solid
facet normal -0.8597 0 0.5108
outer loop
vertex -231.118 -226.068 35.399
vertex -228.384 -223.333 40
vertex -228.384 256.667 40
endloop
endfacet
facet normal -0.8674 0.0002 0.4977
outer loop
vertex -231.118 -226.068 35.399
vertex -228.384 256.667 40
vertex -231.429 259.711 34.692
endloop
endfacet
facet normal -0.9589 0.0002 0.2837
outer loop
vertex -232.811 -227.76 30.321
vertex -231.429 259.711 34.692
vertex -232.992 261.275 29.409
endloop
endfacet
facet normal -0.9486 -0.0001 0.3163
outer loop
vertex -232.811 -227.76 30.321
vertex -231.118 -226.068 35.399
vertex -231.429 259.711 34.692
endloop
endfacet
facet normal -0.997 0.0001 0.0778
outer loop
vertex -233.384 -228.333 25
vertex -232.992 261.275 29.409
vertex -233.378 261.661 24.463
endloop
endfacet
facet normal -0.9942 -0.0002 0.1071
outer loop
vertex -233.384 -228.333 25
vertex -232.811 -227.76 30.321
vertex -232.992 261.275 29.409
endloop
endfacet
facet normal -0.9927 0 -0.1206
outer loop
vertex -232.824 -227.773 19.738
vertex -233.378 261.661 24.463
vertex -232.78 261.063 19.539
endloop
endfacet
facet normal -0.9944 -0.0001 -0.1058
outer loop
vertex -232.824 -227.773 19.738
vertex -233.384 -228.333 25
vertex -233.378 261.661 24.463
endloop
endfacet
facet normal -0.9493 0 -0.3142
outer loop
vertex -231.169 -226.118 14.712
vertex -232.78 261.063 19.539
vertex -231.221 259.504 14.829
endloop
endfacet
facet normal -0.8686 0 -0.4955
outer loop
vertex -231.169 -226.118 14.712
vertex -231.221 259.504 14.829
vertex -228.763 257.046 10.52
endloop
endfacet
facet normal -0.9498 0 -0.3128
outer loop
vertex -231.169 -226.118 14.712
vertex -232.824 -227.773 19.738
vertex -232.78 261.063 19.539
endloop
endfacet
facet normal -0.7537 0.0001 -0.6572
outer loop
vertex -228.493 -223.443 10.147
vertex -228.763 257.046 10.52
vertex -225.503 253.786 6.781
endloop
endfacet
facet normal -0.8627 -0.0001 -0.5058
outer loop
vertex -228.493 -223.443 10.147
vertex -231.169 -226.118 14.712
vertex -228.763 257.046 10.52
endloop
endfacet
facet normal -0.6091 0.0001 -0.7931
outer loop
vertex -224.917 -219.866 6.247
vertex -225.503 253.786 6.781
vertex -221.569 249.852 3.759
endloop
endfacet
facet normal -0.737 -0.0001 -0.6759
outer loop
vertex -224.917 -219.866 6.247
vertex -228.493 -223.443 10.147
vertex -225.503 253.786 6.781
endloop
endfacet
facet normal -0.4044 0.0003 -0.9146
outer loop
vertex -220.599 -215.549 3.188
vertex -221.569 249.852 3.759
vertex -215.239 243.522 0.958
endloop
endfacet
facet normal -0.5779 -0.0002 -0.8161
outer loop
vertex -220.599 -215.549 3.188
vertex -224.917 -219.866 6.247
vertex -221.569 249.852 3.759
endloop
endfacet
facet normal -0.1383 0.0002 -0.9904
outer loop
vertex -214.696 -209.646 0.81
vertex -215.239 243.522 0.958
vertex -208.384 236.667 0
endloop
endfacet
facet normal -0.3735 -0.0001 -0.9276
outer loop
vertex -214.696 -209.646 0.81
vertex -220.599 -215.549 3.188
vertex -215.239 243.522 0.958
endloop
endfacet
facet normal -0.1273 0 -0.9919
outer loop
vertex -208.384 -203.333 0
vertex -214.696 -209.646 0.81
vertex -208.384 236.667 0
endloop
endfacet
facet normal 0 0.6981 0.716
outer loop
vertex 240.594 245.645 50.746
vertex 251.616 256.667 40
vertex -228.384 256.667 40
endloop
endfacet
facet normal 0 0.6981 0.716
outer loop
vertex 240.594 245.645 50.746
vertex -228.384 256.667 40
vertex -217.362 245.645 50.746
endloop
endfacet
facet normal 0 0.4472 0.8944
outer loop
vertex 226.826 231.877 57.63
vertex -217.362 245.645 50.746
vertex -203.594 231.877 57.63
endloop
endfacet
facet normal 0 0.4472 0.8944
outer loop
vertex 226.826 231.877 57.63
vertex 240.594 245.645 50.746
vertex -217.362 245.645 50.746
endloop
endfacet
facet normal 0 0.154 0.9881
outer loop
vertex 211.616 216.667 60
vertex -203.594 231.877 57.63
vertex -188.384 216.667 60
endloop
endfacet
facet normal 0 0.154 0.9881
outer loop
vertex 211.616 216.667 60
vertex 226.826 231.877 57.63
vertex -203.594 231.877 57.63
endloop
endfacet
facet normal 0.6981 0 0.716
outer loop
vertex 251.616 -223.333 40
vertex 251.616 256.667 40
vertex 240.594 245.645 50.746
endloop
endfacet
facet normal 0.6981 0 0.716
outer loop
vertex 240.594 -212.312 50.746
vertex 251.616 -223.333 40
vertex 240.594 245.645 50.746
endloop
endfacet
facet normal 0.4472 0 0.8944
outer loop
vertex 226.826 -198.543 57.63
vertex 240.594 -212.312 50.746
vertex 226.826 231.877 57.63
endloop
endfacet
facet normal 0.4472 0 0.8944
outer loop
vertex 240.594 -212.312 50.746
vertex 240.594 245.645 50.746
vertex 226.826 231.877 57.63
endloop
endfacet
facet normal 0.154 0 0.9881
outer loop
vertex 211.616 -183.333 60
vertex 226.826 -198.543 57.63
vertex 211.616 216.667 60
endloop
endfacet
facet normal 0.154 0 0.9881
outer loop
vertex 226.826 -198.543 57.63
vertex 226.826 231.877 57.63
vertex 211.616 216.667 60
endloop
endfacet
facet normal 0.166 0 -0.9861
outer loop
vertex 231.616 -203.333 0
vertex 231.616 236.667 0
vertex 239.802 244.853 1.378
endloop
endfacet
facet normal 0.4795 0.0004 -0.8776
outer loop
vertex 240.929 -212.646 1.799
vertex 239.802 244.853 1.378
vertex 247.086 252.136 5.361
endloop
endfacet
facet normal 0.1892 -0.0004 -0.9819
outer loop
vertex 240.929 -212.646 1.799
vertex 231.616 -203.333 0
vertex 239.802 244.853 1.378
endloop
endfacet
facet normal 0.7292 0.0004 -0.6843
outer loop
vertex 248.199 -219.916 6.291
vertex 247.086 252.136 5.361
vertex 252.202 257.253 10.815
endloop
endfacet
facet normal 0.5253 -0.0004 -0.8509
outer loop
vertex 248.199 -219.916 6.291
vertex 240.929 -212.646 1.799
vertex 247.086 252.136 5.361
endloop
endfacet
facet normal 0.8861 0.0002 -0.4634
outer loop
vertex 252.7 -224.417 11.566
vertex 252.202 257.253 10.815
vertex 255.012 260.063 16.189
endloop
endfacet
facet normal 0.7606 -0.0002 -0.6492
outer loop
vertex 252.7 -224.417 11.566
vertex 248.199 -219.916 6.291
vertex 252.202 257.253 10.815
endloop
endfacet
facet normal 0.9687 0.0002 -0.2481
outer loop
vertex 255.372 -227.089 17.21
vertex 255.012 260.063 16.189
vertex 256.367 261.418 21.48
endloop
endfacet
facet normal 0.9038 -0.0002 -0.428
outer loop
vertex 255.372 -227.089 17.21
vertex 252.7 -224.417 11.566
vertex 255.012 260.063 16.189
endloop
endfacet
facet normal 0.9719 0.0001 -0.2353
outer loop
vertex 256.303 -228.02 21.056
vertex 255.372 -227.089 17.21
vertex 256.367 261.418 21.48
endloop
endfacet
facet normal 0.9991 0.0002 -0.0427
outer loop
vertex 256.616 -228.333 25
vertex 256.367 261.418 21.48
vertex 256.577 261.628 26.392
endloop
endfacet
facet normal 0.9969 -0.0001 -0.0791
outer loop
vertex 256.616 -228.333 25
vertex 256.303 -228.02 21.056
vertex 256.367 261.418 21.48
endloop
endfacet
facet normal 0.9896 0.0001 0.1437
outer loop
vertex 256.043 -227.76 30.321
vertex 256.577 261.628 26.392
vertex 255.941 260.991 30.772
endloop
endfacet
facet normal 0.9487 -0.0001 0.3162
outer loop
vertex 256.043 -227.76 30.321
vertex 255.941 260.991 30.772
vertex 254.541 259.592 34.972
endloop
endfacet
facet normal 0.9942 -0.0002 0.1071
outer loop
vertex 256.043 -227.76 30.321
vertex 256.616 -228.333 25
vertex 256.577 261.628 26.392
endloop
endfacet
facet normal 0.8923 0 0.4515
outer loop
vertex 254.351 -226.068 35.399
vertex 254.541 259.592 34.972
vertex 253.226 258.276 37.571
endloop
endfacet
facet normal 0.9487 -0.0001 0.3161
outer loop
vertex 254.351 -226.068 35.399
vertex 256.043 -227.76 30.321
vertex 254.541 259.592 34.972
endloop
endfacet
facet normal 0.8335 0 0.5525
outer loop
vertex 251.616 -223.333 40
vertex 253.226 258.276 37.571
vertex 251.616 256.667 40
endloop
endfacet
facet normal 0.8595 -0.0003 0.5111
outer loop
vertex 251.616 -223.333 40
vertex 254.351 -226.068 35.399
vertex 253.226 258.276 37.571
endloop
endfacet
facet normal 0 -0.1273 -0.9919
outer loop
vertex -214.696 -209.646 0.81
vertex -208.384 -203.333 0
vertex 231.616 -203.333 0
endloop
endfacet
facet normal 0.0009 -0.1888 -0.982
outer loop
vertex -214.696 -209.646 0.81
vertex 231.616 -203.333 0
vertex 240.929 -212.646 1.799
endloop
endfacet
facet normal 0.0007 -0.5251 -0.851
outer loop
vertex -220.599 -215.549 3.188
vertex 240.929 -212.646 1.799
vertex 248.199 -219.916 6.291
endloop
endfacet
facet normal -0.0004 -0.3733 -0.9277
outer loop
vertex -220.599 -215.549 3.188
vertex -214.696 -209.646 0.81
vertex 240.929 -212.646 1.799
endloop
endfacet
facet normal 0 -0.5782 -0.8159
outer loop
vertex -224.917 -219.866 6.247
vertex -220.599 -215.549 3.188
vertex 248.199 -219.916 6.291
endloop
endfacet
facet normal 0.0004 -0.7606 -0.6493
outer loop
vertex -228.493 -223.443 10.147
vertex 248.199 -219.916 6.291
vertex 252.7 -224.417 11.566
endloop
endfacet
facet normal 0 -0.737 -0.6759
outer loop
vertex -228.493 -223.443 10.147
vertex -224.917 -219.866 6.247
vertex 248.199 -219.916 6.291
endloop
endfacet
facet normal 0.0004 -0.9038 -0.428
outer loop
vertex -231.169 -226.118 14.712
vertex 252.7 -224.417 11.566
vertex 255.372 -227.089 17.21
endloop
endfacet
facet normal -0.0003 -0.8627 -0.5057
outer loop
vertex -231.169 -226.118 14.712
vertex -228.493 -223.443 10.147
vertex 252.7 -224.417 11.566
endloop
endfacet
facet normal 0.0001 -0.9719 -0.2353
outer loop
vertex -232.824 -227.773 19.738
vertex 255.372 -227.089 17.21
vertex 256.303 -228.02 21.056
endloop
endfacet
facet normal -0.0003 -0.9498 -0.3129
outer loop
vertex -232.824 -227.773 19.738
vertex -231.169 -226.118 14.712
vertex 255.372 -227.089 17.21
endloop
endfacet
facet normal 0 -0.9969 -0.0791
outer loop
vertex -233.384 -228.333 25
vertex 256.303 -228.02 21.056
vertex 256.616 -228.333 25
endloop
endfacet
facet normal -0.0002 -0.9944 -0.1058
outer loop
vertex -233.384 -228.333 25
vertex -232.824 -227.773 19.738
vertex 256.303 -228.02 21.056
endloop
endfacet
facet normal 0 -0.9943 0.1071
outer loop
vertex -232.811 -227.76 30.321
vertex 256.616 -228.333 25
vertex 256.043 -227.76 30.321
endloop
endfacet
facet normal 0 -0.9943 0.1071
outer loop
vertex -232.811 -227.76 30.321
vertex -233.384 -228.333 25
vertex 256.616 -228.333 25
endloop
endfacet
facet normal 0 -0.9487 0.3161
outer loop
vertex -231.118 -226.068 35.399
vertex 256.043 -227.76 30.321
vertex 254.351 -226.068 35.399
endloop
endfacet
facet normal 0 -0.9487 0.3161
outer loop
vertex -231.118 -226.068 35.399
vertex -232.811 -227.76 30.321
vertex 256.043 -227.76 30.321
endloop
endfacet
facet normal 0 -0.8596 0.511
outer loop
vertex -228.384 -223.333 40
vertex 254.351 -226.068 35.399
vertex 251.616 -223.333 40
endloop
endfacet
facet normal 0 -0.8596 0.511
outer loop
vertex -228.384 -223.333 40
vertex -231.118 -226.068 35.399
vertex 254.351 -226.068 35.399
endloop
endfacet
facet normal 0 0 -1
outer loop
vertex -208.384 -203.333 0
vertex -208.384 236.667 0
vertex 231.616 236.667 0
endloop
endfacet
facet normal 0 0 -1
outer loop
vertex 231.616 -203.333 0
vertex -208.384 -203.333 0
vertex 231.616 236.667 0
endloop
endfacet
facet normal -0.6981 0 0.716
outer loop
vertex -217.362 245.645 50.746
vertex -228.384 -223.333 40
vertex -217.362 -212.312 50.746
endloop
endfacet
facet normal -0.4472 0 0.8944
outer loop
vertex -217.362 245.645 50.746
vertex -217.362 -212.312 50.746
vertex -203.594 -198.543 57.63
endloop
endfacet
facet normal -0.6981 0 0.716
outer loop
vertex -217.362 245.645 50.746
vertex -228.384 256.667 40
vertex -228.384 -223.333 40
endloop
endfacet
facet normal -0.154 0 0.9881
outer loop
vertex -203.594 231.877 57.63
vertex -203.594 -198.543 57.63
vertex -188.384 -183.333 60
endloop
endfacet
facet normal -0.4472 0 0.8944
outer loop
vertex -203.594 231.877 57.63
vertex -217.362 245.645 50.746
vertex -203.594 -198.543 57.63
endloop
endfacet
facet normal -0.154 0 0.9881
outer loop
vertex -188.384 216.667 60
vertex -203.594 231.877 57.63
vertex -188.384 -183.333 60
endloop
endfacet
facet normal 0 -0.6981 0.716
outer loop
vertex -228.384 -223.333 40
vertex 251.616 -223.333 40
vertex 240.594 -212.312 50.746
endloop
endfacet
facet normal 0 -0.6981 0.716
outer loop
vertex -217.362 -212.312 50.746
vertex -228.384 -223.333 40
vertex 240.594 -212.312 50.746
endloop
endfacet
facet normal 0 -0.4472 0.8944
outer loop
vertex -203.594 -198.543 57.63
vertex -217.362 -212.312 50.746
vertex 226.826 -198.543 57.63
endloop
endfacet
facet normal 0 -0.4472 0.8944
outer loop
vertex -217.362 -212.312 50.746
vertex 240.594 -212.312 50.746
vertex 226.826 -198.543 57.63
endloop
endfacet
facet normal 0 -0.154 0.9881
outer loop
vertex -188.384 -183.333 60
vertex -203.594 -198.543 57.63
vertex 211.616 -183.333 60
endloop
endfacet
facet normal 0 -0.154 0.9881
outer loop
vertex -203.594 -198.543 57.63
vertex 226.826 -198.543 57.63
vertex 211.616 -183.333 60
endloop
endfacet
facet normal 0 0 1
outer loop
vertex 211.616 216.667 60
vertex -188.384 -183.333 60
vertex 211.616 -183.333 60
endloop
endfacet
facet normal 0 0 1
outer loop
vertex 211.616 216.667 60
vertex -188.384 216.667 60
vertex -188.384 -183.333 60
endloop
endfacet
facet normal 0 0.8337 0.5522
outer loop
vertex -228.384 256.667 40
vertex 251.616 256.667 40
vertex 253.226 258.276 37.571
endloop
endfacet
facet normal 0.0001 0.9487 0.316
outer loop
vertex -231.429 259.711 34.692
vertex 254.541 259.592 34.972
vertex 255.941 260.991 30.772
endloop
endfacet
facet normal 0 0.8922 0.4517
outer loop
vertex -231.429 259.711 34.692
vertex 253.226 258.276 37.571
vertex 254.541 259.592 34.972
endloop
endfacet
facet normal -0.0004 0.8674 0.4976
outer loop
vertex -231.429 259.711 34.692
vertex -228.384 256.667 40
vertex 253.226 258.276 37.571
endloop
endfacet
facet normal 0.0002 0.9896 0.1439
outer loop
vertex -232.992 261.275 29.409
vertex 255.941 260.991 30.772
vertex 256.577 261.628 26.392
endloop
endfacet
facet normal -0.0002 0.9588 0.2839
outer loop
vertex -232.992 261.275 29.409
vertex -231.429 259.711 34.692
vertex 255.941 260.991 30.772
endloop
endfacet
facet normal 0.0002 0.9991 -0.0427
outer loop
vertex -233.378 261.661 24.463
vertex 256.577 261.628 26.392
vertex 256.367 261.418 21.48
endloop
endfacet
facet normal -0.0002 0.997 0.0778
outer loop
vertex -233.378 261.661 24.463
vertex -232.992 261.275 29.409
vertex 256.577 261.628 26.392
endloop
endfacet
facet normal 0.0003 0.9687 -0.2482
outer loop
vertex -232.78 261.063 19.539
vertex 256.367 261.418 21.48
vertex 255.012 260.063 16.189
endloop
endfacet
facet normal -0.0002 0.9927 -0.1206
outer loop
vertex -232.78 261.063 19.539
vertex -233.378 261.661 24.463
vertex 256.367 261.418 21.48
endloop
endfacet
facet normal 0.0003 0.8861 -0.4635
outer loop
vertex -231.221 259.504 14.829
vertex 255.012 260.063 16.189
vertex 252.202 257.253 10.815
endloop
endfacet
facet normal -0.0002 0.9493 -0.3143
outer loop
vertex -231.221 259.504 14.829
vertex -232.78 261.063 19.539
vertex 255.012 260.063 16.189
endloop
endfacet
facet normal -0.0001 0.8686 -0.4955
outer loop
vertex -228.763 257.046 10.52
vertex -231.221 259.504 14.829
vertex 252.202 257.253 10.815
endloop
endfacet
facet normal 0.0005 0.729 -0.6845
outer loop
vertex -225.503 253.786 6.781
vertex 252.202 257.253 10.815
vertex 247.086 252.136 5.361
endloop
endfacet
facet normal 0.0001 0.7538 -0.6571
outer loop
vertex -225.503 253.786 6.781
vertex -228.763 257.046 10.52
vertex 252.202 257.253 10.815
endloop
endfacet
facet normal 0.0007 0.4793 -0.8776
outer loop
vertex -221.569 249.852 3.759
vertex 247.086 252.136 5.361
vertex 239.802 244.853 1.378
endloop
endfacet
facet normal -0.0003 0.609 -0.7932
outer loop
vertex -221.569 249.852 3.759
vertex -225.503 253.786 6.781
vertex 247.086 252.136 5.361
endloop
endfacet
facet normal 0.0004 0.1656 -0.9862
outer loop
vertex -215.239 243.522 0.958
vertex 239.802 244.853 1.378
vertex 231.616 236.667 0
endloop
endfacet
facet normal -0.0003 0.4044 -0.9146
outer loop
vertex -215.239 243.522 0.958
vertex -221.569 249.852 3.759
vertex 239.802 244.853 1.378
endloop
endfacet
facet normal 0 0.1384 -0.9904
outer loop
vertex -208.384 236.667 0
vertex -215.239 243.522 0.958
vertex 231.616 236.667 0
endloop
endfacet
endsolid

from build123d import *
from OCP.BRepAlgoAPI import BRepAlgoAPI_Cut
from OCP.TopTools import TopTools_ListOfShape

# Parameters (mm, degrees)
SKETCH1_W           = 500
SKETCH1_H           = 500
BOSS_EXTRUDE1_DEPTH = 60
FILLET3_R           = 50
FILLET4_R           = 50
FILLET6_START       = -234
FILLET6_DEPTH       = 502
FILLET6_2_DEPTH     = 492


with BuildPart() as part:
    # Sketch1 → Boss-Extrude1 (new body)
    with BuildSketch(Plane.XY):
        with Locations((11.616161616, 16.666666667)):
            Rectangle(SKETCH1_W, SKETCH1_H)
    extrude(amount=BOSS_EXTRUDE1_DEPTH)

    # Fillet3
    fillet3_edges = [part.edges().sort_by_distance(p)[0] for p in [
        (11.616161616, -233.333333333, 60),
        (261.616161616, 16.666666667, 60),
        (11.616161616, 266.666666667, 60),
        (-238.383838384, 16.666666667, 60),
    ]]
    fillet(fillet3_edges, radius=FILLET3_R)

    # Fillet4
    # the kernel refuses this fillet: 50 mm, written as the material it takes off along each edge
    with BuildSketch(Plane(origin=(-238.383838384, 341.666666667, 0), x_dir=(0, 0, 1), z_dir=(0, -1, 0)), Plane(origin=(336.616161616, 266.666666667, 0), x_dir=(0, 0, 1), z_dir=(-1, 0, 0))) as fillet4_piece_1:
        with BuildLine():
            CenterArc((50, -30), FILLET4_R, 143.130102354, 36.869897646)
            Line((0, -30), (-1, -30))
            Line((-1, -30), (-1, 0))
            Line((-1, 0), (0, 1))
            ThreePointArc((0, 1), (5, 1), (9.2, 0.6))
            Line((9.2, 0.6), (10, 0))
        make_face()
    extrude(amount=650, mode=Mode.SUBTRACT)
    with BuildSketch(Plane(origin=(-313.383838384, -233.333333333, 0), x_dir=(0, 1, 0), z_dir=(1, 0, 0)), Plane(origin=(261.616161616, -308.333333333, 0), x_dir=(-1, 0, 0), z_dir=(0, 1, 0))) as fillet4_piece_2:
        with BuildLine():
            CenterArc((30, 50), FILLET4_R, 233.130102354, 36.869897646)
            Line((0, 10), (-0.6, 9.2))
            ThreePointArc((-0.6, 9.2), (-1, 5), (-1, 0))
            Line((-1, 0), (0, -1))
            Line((0, -1), (30, -1))
            Line((30, -1), (30, 0))
        make_face()
    extrude(amount=650, mode=Mode.SUBTRACT)


with BuildPart() as fillet6_tool:
    # Fillet6: read off the stored shape, not the designer's step
    # Fillet6 outline → Fillet6 (new body)
    with BuildSketch(Plane(origin=(0, 0, 0), x_dir=(1, 0, 0), z_dir=(0, 1, 0)).offset(FILLET6_START)):
        with BuildLine():
            ThreePointArc((261.616161616, -10), (247.427549917, -2.565835097), (231.616161616, 0))
            ThreePointArc((231.616161616, 0), (253.976841391, -13.819660113), (251.616161616, -40))
            ThreePointArc((251.616161616, -40), (259.050326518, -25.811388301), (261.616161616, -10))
        make_face()
        with BuildLine():
            ThreePointArc((-228.383838384, -40), (-230.744518159, -13.819660113), (-208.383838384, 0))
            ThreePointArc((-208.383838384, 0), (-224.195226685, -2.565835097), (-238.383838384, -10))
            ThreePointArc((-238.383838384, -10), (-235.818003286, -25.811388301), (-228.383838384, -40))
        make_face()
    extrude(amount=FILLET6_DEPTH)


with BuildPart() as part_1:
    add(part.part)

    # Fillet6: cut by fillet6_tool, with a tolerance
    fillet6_stock = TopTools_ListOfShape()
    fillet6_stock.Append(part_1.part.wrapped)
    fillet6_tools = TopTools_ListOfShape()
    fillet6_tools.Append(fillet6_tool.part.wrapped)
    fillet6_cut = BRepAlgoAPI_Cut()
    fillet6_cut.SetArguments(fillet6_stock)
    fillet6_cut.SetTools(fillet6_tools)
    fillet6_cut.SetFuzzyValue(0.00001)
    fillet6_cut.Build()
    add(Compound.cast(fillet6_cut.Shape()).solids(), mode=Mode.REPLACE)


with BuildPart() as fillet6_2_tool:
    # Fillet6 2 outline → Fillet6 2 (new body)
    with BuildSketch(Plane.YZ.offset(FILLET6_START)):
        with BuildLine():
            ThreePointArc((-233.333333333, 10), (-219.144721634, 2.565835097), (-203.333333333, 0))
            ThreePointArc((-203.333333333, 0), (-225.694013108, 13.819660113), (-223.333333333, 40))
            ThreePointArc((-223.333333333, 40), (-230.767498236, 25.811388301), (-233.333333333, 10))
        make_face()
        with BuildLine():
            ThreePointArc((256.666666667, 40), (259.027346442, 13.819660113), (236.666666667, 0))
            ThreePointArc((236.666666667, 0), (252.478054612, 2.565834979), (266.666666667, 10))
            ThreePointArc((266.666666667, 10), (264.100831569, 25.811388301), (256.666666667, 40))
        make_face()
    extrude(amount=FILLET6_2_DEPTH)


with BuildPart() as part_2:
    add(part_1.part)

    # Fillet6 2: cut by fillet6_2_tool, with a tolerance
    fillet6_2_stock = TopTools_ListOfShape()
    fillet6_2_stock.Append(part_2.part.wrapped)
    fillet6_2_tools = TopTools_ListOfShape()
    fillet6_2_tools.Append(fillet6_2_tool.part.wrapped)
    fillet6_2_cut = BRepAlgoAPI_Cut()
    fillet6_2_cut.SetArguments(fillet6_2_stock)
    fillet6_2_cut.SetTools(fillet6_2_tools)
    fillet6_2_cut.SetFuzzyValue(0.00001)
    fillet6_2_cut.Build()
    add(Compound.cast(fillet6_2_cut.Shape()).solids(), mode=Mode.REPLACE)


solid = part_2.part
